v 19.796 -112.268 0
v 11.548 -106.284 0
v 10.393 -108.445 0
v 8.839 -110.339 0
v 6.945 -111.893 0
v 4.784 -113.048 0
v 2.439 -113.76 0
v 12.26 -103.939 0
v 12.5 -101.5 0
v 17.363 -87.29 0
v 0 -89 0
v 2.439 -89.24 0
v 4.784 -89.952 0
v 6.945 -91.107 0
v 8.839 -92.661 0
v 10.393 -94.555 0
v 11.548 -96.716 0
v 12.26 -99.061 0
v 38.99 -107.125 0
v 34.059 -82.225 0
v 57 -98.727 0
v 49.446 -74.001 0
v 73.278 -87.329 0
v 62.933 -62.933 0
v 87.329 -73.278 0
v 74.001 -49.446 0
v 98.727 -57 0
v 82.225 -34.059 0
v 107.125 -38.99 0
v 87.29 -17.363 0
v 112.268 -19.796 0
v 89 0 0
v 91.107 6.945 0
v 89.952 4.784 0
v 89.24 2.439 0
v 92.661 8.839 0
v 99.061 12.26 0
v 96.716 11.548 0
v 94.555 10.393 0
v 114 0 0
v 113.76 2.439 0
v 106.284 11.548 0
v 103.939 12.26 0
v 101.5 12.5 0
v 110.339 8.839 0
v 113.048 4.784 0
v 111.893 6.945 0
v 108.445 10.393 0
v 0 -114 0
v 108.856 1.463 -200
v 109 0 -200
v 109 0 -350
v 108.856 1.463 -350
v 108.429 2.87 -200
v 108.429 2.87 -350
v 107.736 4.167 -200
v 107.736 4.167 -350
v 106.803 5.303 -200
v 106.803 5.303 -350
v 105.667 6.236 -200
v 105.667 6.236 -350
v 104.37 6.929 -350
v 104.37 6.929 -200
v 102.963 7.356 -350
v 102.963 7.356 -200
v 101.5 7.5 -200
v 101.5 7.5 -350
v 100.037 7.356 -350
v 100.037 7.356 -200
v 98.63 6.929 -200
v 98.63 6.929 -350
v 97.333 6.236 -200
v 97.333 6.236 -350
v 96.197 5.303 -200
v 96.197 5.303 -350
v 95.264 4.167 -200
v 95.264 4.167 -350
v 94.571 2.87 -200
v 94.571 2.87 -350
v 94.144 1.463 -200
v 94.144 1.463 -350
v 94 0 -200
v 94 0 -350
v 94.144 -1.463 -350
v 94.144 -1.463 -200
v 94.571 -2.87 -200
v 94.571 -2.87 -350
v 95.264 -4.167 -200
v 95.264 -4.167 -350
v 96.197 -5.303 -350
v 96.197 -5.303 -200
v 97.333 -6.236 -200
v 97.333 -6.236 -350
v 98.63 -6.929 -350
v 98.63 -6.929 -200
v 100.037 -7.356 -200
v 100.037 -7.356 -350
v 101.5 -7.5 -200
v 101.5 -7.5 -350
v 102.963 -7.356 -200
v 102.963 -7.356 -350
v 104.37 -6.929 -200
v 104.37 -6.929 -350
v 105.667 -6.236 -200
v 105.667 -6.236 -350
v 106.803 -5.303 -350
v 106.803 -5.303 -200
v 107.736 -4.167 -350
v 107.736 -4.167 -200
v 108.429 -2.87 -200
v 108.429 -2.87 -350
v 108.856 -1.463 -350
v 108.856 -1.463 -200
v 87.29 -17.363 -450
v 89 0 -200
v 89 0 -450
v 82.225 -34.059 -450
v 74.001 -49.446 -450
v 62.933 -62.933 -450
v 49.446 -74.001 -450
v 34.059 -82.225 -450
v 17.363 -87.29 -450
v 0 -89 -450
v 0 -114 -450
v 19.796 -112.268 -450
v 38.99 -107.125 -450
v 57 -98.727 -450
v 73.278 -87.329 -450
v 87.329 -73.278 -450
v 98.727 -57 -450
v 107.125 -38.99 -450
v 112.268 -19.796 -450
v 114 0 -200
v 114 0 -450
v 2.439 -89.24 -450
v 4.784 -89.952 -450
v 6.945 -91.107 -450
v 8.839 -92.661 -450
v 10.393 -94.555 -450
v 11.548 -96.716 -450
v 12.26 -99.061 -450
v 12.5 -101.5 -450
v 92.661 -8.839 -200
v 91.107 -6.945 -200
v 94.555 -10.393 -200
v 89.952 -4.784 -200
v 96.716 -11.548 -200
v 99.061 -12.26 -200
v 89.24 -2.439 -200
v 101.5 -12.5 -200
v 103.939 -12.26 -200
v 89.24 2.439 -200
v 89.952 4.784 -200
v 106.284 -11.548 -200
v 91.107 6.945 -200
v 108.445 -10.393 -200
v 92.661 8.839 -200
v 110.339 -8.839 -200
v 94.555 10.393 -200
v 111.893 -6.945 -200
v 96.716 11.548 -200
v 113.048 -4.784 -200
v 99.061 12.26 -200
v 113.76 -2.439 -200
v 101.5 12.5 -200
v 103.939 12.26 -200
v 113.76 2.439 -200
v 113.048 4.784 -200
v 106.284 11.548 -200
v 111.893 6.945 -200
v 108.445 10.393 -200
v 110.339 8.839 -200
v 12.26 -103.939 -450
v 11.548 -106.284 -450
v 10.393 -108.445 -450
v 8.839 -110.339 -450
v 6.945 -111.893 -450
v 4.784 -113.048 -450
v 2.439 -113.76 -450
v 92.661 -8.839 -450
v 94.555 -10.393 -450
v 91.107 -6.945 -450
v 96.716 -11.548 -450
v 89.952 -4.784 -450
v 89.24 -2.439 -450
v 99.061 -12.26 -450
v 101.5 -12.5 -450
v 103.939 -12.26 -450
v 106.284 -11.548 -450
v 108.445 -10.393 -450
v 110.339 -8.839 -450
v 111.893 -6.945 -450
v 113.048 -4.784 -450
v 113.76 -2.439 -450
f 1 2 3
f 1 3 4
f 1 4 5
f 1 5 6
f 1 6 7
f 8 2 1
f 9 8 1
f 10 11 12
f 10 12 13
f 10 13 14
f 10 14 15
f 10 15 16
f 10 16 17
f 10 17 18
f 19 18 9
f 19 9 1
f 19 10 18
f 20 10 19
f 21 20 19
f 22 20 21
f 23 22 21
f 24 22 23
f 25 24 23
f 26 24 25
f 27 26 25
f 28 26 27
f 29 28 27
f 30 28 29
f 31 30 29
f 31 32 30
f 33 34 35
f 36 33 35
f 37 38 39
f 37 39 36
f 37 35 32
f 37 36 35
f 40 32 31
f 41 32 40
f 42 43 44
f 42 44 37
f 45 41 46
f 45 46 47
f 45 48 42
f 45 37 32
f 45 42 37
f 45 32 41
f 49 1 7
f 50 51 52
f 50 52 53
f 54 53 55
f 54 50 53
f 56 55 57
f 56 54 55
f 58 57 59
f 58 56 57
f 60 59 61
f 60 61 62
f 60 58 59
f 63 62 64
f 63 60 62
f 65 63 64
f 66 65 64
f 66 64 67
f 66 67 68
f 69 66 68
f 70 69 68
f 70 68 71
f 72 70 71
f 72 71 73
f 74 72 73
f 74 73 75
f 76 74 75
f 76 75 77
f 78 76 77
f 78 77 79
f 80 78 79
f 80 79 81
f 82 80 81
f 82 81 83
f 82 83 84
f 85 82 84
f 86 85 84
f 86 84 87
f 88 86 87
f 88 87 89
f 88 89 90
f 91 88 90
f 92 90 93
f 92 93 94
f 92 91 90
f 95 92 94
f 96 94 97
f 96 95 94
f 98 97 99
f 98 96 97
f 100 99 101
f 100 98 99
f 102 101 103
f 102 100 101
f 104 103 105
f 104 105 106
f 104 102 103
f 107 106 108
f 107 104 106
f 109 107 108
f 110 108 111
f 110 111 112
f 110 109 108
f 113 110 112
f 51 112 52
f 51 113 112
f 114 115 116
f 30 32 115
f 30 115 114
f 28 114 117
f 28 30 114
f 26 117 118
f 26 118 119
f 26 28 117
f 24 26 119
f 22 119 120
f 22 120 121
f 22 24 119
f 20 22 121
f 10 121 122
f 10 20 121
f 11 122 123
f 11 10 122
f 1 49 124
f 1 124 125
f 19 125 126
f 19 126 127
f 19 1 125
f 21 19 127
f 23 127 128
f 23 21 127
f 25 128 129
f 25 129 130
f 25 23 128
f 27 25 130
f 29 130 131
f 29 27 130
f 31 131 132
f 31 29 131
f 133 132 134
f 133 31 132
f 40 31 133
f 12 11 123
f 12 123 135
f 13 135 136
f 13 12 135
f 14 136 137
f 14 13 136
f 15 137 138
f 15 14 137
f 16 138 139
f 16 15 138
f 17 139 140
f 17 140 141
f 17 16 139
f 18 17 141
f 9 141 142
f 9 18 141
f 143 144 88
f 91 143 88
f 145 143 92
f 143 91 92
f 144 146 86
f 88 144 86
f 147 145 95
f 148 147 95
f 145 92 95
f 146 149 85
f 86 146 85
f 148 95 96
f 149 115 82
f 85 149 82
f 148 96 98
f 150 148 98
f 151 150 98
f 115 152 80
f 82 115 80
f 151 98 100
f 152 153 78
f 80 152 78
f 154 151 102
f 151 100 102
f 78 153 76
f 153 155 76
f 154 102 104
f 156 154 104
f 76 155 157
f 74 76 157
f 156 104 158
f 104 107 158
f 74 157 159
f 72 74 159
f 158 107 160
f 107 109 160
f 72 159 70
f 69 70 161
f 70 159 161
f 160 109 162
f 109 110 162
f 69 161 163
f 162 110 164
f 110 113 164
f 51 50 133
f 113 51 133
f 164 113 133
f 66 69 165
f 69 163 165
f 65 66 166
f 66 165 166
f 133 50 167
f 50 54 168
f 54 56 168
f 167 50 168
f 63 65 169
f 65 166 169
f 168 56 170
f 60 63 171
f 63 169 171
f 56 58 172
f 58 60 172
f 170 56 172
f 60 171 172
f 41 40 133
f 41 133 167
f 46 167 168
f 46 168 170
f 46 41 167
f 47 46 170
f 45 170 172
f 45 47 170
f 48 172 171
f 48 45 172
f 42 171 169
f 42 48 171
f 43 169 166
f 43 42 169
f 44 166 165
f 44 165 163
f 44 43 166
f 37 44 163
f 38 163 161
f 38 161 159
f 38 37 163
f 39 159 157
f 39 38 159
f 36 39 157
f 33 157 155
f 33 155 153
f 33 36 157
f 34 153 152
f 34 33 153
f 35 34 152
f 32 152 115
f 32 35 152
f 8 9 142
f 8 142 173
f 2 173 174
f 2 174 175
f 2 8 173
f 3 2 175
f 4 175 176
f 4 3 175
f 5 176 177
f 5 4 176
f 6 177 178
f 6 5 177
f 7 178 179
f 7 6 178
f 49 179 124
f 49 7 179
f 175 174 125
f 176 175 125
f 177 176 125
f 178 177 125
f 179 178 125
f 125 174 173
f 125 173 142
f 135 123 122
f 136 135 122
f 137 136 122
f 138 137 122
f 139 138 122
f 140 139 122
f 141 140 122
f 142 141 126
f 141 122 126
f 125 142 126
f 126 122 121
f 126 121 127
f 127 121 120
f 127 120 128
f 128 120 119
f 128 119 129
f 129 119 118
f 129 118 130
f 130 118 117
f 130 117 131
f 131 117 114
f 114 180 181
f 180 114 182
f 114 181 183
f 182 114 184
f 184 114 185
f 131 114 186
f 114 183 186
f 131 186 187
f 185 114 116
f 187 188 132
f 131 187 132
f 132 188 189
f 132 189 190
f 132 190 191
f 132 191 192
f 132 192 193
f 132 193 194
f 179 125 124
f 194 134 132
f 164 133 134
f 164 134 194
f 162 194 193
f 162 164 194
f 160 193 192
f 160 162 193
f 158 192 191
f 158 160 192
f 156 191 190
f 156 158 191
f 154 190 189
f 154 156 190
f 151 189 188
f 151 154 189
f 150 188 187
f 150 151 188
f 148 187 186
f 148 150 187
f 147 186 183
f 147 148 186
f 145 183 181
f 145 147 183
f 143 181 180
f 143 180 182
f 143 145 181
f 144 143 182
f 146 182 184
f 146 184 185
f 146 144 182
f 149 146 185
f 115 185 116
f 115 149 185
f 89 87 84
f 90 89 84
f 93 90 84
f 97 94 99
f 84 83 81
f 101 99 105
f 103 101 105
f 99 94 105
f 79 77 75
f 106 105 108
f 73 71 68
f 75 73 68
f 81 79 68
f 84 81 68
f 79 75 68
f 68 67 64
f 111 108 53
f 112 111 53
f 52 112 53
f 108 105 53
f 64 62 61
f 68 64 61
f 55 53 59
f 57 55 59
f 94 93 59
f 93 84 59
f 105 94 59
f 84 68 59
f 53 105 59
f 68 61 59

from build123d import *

# Parameters (mm, degrees)
BOSS_EXTRU_1_DEPTH = 450
ESQUISSE1_3_R      = 7.5
BOSS_EXTRU_2_DEPTH = 350
ESQUISSE1_4_R      = 7.5
BOSS_EXTRU_3_DEPTH = 200


with BuildPart() as part:
    # Esquisse1 → Boss.-Extru.1 (new body)
    with BuildSketch(Plane.XY):
        with BuildLine():
            ThreePointArc((114, 0), (101.5, -12.5), (89, 0))
            ThreePointArc((89, 0), (62.932503523, -62.932503528), (-6e-09, -89))
            ThreePointArc((-6e-09, -89), (8.838834763, -92.661165233), (12.5, -101.5))
            ThreePointArc((12.5, -101.5), (8.838834791, -110.338834739), (7.4e-08, -114))
            ThreePointArc((7.4e-08, -114), (80.610173081, -80.610173029), (114, 0))
        make_face()
    extrude(amount=-BOSS_EXTRU_1_DEPTH)



with BuildPart() as body_2:
    # Esquisse1<3> → Boss.-Extru.2 (new body)
    with BuildSketch(Plane.XY):
        with Locations((101.5, 0)):
            Circle(ESQUISSE1_3_R)
    extrude(amount=-BOSS_EXTRU_2_DEPTH)


with BuildPart() as part_1:
    add(part.part)

    add(body_2.part)  # Boss.-Extru.3 merges body 2
    # Esquisse1<4> → Boss.-Extru.3 (add)
    with BuildSketch(Plane.XY):
        with BuildLine():
            ThreePointArc((114, 0), (101.5, 12.5), (89, 0))
            ThreePointArc((89, 0), (101.5, -12.5), (114, 0))
        make_face()
        with Locations((101.5, 0)):
            Circle(ESQUISSE1_4_R, mode=Mode.SUBTRACT)
    extrude(amount=-BOSS_EXTRU_3_DEPTH)


solid = part_1.part
